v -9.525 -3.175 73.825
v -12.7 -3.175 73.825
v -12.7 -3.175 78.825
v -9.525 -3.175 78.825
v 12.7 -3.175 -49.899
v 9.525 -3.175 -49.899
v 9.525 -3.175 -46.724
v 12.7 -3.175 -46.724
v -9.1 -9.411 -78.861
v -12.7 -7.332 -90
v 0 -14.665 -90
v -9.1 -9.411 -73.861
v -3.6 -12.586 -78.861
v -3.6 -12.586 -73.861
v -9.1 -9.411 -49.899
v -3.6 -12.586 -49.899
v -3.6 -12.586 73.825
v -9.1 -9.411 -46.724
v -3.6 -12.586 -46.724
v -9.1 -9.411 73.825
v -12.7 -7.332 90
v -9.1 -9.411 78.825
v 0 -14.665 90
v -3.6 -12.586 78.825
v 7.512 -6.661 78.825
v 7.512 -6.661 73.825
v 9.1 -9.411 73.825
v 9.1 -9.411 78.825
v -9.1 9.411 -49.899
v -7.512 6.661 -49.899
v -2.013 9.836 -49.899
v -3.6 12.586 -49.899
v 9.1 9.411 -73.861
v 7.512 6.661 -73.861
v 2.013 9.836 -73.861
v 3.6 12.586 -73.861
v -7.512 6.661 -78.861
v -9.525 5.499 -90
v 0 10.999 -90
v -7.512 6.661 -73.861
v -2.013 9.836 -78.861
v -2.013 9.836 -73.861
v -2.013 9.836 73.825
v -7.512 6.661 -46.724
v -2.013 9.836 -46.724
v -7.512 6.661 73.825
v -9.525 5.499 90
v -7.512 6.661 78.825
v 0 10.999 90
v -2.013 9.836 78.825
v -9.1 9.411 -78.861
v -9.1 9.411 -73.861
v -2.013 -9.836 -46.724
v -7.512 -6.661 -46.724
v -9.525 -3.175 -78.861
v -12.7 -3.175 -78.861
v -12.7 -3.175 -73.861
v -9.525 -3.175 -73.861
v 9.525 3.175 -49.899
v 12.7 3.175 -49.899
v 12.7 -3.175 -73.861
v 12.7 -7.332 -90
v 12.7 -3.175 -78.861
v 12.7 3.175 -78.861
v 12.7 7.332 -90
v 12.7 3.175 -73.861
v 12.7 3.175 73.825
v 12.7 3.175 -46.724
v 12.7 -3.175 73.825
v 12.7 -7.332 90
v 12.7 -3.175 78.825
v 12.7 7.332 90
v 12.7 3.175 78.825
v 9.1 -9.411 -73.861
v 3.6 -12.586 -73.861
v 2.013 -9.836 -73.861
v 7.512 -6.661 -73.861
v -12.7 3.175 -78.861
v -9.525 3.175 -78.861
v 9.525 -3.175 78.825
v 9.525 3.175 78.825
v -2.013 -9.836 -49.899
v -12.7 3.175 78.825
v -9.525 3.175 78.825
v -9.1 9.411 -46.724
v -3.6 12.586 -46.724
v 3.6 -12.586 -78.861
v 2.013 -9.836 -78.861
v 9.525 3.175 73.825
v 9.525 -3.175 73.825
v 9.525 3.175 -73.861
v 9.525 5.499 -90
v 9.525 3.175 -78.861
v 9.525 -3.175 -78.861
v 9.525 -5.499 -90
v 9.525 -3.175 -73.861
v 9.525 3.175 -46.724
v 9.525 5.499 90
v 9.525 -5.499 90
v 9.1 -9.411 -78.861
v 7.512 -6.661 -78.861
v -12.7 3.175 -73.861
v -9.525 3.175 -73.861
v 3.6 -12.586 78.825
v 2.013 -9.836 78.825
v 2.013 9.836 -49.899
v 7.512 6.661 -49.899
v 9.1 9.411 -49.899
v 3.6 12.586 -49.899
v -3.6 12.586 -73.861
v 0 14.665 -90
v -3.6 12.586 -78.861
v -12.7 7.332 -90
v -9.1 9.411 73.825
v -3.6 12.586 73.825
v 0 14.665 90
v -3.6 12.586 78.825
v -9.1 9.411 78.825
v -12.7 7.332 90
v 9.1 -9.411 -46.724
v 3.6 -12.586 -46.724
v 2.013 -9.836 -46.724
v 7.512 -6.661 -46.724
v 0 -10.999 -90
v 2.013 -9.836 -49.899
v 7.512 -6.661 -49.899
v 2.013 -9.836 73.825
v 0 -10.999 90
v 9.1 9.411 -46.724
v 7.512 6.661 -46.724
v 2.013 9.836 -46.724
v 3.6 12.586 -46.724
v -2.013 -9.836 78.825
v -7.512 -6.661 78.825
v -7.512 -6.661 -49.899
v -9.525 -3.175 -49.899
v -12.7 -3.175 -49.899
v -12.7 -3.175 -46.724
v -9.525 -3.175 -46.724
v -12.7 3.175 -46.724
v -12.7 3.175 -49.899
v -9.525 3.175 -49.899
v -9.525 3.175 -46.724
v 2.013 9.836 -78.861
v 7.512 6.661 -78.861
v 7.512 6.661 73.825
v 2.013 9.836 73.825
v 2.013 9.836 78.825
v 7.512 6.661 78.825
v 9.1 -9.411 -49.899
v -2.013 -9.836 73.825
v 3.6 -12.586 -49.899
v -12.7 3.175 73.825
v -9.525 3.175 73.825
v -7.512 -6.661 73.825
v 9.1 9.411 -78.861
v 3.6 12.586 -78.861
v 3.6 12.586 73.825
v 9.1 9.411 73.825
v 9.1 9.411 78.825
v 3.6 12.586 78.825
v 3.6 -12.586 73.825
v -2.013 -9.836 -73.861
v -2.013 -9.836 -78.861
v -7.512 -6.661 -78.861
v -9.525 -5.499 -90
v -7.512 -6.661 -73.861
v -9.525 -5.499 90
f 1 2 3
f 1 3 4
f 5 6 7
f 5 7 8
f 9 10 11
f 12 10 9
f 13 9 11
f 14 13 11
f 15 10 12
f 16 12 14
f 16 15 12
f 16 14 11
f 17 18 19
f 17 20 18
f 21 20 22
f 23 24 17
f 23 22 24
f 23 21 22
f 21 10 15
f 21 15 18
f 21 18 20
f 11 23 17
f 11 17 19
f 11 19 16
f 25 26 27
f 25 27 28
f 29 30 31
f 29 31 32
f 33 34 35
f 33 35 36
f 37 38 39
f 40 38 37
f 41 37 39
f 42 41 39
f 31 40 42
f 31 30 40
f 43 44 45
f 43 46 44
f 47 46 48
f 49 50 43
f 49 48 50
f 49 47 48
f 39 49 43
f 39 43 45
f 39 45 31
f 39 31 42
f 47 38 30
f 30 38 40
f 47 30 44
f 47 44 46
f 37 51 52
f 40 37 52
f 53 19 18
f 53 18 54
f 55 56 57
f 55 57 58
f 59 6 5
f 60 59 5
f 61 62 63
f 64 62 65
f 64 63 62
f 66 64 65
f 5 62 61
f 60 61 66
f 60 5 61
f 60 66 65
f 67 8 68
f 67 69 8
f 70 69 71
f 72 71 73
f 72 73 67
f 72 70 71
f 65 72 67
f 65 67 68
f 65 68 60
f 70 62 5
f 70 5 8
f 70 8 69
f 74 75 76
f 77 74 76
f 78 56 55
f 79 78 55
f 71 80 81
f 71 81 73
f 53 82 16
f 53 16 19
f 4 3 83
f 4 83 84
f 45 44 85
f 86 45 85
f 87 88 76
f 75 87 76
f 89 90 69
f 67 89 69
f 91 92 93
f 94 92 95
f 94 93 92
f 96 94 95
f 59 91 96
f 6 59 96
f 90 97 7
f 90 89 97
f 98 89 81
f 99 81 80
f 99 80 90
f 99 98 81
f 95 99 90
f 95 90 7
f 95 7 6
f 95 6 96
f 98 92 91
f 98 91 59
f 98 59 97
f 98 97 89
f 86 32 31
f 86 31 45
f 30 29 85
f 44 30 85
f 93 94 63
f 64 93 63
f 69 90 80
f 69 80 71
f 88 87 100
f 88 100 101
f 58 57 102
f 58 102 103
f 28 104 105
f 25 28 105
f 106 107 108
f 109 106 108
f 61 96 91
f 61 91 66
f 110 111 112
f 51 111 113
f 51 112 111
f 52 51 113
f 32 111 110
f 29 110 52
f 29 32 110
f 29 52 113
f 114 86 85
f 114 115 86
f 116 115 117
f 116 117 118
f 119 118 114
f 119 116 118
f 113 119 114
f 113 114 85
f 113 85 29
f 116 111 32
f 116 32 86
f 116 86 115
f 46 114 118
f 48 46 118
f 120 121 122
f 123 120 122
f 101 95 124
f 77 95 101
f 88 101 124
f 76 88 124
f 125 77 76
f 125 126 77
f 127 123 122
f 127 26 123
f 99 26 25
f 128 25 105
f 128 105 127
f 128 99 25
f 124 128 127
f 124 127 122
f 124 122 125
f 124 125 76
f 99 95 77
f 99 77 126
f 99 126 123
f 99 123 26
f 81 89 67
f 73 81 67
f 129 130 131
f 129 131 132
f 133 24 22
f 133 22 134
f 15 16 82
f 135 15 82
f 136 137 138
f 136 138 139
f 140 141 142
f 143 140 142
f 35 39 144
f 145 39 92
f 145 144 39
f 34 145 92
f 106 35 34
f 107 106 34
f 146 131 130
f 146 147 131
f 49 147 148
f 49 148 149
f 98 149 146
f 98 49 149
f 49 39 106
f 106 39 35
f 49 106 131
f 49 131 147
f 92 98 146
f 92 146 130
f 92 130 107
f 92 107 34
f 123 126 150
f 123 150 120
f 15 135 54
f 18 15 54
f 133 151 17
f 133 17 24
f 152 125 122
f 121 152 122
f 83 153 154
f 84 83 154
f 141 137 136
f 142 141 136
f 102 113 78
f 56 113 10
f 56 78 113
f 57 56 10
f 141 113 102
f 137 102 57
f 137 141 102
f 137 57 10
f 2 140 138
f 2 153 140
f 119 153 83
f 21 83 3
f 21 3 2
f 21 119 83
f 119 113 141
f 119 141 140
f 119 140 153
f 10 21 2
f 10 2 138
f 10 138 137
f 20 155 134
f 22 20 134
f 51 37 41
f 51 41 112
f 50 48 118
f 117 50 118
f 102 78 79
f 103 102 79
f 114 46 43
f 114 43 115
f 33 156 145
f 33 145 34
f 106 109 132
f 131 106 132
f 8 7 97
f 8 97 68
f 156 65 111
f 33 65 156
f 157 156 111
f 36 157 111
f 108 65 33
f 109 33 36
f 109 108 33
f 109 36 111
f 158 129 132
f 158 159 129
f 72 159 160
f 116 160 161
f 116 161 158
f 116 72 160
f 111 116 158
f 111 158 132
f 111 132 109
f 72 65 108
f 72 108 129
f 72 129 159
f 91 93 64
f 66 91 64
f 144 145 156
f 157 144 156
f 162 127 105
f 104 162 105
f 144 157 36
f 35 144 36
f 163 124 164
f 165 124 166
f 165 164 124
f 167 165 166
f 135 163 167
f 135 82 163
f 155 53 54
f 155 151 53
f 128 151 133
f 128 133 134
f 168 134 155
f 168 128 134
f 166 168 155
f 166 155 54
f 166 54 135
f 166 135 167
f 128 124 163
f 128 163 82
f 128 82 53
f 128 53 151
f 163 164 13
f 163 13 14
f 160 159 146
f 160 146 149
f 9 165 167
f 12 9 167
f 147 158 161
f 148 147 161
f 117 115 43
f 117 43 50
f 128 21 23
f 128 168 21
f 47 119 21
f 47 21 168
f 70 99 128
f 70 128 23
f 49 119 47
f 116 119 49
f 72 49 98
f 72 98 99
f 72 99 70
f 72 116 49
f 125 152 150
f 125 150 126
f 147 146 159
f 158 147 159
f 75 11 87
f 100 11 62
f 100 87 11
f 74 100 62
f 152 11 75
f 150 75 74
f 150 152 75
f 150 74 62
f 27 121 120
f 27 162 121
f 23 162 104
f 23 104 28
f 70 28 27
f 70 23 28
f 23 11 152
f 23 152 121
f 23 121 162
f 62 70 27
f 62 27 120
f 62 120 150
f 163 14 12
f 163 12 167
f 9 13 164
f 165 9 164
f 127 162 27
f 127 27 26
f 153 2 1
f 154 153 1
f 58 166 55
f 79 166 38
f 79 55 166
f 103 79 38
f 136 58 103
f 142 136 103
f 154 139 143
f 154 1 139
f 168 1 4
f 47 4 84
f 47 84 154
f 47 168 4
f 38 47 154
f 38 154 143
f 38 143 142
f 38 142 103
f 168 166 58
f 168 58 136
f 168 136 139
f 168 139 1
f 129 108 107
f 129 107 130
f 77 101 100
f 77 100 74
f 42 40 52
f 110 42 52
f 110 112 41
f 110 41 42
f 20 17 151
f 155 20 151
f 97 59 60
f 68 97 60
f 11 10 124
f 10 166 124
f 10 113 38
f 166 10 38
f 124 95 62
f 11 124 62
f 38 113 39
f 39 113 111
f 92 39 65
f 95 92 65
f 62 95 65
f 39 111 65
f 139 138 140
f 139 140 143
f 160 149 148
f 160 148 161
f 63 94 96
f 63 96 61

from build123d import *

# Parameters (mm, degrees)
BOSS_EXTRUDE1_DEPTH     = 90
CUT_EXTRUDE2_DEPTH      = 3.175
CUT_EXTRUDE2_DEPTH_BACK = 3.175
SKETCH4_W               = 3.175
SKETCH4_H               = 5
SKETCH4_H_2             = 3.175
CUT_EXTRUDE3_DEPTH      = 3.175
CUT_EXTRUDE3_DEPTH_BACK = 3.175
SKETCH7_W               = 5
SKETCH7_H               = 3.175
SKETCH7_W_2             = 3.175
CUT_EXTRUDE4_DEPTH      = 3.175
CUT_EXTRUDE4_DEPTH_BACK = 3.175
SKETCH8_W               = 5
SKETCH8_H               = 3.175
SKETCH8_W_2             = 3.175


with BuildPart() as part:
    # Sketch3 → Boss-Extrude1 (new, symmetric)
    with BuildSketch(Plane.XY):
        Polygon((0, 14.664696837), (-12.7, 7.332348419), (-12.7, -7.332348419), (0, -14.664696837), (12.7, -7.332348419), (12.7, 7.332348419), align=None)
        Polygon((0, 10.998522628), (9.525, 5.499261314), (9.525, -5.499261314), (0, -10.998522628), (-9.525, -5.499261314), (-9.525, 5.499261314), align=None, mode=Mode.SUBTRACT)
    extrude(amount=BOSS_EXTRUDE1_DEPTH, both=True)

    # Sketch4 → Cut-Extrude2 (cut, two sides: drawn at the far end of the back side and taken through both)
    with BuildSketch(Plane(origin=(0, 0, 0), x_dir=(1, 0, 0), z_dir=(0, 1, 0)).offset(-CUT_EXTRUDE2_DEPTH_BACK)):
        with Locations((-11.1125, -76.325394791)):
            Rectangle(SKETCH4_W, SKETCH4_H)
        with Locations((-11.1125, 48.311416829)):
            Rectangle(SKETCH4_W, SKETCH4_H_2)
        with Locations((11.1125, 76.360728449)):
            Rectangle(SKETCH4_W, SKETCH4_H)
        with Locations((11.1125, 48.311416829)):
            Rectangle(SKETCH4_W, SKETCH4_H_2)
        with Locations((11.1125, -76.325394791)):
            Rectangle(SKETCH4_W, SKETCH4_H)
        with Locations((-11.1125, 76.360728449)):
            Rectangle(SKETCH4_W, SKETCH4_H)
    extrude(amount=CUT_EXTRUDE2_DEPTH + CUT_EXTRUDE2_DEPTH_BACK, mode=Mode.SUBTRACT)

    # Sketch7 → Cut-Extrude3 (cut, two sides: drawn at the far end of the back side and taken through both)
    with BuildSketch(Plane(origin=(0, 0, 0), x_dir=(0, 0, 1), z_dir=(-0.8660254037844387, 0.4999999999999999, 0)).offset(-CUT_EXTRUDE3_DEPTH_BACK)):
        with Locations((76.325394791, -11.1125)):
            Rectangle(SKETCH7_W, SKETCH7_H)
        with Locations((-48.311416829, -11.1125)):
            Rectangle(SKETCH7_W_2, SKETCH7_H)
        with Locations((-76.360728449, 11.1125)):
            Rectangle(SKETCH7_W, SKETCH7_H)
        with Locations((-48.311416829, 11.1125)):
            Rectangle(SKETCH7_W_2, SKETCH7_H)
        with Locations((76.325394791, 11.1125)):
            Rectangle(SKETCH7_W, SKETCH7_H)
        with Locations((-76.360728449, -11.1125)):
            Rectangle(SKETCH7_W, SKETCH7_H)
    extrude(amount=CUT_EXTRUDE3_DEPTH + CUT_EXTRUDE3_DEPTH_BACK, mode=Mode.SUBTRACT)

    # Sketch8 → Cut-Extrude4 (cut, two sides: drawn at the far end of the back side and taken through both)
    with BuildSketch(Plane(origin=(0, 0, 0), x_dir=(0, 0, 1), z_dir=(-0.8660254037844387, -0.4999999999999999, 0)).offset(-CUT_EXTRUDE4_DEPTH_BACK)):
        with Locations((76.325394791, -11.1125)):
            Rectangle(SKETCH8_W, SKETCH8_H)
        with Locations((-48.311416829, -11.1125)):
            Rectangle(SKETCH8_W_2, SKETCH8_H)
        with Locations((-76.360728449, 11.1125)):
            Rectangle(SKETCH8_W, SKETCH8_H)
        with Locations((-48.311416829, 11.1125)):
            Rectangle(SKETCH8_W_2, SKETCH8_H)
        with Locations((76.325394791, 11.1125)):
            Rectangle(SKETCH8_W, SKETCH8_H)
        with Locations((-76.360728449, -11.1125)):
            Rectangle(SKETCH8_W, SKETCH8_H)
    extrude(amount=CUT_EXTRUDE4_DEPTH + CUT_EXTRUDE4_DEPTH_BACK, mode=Mode.SUBTRACT)


solid = part.part
